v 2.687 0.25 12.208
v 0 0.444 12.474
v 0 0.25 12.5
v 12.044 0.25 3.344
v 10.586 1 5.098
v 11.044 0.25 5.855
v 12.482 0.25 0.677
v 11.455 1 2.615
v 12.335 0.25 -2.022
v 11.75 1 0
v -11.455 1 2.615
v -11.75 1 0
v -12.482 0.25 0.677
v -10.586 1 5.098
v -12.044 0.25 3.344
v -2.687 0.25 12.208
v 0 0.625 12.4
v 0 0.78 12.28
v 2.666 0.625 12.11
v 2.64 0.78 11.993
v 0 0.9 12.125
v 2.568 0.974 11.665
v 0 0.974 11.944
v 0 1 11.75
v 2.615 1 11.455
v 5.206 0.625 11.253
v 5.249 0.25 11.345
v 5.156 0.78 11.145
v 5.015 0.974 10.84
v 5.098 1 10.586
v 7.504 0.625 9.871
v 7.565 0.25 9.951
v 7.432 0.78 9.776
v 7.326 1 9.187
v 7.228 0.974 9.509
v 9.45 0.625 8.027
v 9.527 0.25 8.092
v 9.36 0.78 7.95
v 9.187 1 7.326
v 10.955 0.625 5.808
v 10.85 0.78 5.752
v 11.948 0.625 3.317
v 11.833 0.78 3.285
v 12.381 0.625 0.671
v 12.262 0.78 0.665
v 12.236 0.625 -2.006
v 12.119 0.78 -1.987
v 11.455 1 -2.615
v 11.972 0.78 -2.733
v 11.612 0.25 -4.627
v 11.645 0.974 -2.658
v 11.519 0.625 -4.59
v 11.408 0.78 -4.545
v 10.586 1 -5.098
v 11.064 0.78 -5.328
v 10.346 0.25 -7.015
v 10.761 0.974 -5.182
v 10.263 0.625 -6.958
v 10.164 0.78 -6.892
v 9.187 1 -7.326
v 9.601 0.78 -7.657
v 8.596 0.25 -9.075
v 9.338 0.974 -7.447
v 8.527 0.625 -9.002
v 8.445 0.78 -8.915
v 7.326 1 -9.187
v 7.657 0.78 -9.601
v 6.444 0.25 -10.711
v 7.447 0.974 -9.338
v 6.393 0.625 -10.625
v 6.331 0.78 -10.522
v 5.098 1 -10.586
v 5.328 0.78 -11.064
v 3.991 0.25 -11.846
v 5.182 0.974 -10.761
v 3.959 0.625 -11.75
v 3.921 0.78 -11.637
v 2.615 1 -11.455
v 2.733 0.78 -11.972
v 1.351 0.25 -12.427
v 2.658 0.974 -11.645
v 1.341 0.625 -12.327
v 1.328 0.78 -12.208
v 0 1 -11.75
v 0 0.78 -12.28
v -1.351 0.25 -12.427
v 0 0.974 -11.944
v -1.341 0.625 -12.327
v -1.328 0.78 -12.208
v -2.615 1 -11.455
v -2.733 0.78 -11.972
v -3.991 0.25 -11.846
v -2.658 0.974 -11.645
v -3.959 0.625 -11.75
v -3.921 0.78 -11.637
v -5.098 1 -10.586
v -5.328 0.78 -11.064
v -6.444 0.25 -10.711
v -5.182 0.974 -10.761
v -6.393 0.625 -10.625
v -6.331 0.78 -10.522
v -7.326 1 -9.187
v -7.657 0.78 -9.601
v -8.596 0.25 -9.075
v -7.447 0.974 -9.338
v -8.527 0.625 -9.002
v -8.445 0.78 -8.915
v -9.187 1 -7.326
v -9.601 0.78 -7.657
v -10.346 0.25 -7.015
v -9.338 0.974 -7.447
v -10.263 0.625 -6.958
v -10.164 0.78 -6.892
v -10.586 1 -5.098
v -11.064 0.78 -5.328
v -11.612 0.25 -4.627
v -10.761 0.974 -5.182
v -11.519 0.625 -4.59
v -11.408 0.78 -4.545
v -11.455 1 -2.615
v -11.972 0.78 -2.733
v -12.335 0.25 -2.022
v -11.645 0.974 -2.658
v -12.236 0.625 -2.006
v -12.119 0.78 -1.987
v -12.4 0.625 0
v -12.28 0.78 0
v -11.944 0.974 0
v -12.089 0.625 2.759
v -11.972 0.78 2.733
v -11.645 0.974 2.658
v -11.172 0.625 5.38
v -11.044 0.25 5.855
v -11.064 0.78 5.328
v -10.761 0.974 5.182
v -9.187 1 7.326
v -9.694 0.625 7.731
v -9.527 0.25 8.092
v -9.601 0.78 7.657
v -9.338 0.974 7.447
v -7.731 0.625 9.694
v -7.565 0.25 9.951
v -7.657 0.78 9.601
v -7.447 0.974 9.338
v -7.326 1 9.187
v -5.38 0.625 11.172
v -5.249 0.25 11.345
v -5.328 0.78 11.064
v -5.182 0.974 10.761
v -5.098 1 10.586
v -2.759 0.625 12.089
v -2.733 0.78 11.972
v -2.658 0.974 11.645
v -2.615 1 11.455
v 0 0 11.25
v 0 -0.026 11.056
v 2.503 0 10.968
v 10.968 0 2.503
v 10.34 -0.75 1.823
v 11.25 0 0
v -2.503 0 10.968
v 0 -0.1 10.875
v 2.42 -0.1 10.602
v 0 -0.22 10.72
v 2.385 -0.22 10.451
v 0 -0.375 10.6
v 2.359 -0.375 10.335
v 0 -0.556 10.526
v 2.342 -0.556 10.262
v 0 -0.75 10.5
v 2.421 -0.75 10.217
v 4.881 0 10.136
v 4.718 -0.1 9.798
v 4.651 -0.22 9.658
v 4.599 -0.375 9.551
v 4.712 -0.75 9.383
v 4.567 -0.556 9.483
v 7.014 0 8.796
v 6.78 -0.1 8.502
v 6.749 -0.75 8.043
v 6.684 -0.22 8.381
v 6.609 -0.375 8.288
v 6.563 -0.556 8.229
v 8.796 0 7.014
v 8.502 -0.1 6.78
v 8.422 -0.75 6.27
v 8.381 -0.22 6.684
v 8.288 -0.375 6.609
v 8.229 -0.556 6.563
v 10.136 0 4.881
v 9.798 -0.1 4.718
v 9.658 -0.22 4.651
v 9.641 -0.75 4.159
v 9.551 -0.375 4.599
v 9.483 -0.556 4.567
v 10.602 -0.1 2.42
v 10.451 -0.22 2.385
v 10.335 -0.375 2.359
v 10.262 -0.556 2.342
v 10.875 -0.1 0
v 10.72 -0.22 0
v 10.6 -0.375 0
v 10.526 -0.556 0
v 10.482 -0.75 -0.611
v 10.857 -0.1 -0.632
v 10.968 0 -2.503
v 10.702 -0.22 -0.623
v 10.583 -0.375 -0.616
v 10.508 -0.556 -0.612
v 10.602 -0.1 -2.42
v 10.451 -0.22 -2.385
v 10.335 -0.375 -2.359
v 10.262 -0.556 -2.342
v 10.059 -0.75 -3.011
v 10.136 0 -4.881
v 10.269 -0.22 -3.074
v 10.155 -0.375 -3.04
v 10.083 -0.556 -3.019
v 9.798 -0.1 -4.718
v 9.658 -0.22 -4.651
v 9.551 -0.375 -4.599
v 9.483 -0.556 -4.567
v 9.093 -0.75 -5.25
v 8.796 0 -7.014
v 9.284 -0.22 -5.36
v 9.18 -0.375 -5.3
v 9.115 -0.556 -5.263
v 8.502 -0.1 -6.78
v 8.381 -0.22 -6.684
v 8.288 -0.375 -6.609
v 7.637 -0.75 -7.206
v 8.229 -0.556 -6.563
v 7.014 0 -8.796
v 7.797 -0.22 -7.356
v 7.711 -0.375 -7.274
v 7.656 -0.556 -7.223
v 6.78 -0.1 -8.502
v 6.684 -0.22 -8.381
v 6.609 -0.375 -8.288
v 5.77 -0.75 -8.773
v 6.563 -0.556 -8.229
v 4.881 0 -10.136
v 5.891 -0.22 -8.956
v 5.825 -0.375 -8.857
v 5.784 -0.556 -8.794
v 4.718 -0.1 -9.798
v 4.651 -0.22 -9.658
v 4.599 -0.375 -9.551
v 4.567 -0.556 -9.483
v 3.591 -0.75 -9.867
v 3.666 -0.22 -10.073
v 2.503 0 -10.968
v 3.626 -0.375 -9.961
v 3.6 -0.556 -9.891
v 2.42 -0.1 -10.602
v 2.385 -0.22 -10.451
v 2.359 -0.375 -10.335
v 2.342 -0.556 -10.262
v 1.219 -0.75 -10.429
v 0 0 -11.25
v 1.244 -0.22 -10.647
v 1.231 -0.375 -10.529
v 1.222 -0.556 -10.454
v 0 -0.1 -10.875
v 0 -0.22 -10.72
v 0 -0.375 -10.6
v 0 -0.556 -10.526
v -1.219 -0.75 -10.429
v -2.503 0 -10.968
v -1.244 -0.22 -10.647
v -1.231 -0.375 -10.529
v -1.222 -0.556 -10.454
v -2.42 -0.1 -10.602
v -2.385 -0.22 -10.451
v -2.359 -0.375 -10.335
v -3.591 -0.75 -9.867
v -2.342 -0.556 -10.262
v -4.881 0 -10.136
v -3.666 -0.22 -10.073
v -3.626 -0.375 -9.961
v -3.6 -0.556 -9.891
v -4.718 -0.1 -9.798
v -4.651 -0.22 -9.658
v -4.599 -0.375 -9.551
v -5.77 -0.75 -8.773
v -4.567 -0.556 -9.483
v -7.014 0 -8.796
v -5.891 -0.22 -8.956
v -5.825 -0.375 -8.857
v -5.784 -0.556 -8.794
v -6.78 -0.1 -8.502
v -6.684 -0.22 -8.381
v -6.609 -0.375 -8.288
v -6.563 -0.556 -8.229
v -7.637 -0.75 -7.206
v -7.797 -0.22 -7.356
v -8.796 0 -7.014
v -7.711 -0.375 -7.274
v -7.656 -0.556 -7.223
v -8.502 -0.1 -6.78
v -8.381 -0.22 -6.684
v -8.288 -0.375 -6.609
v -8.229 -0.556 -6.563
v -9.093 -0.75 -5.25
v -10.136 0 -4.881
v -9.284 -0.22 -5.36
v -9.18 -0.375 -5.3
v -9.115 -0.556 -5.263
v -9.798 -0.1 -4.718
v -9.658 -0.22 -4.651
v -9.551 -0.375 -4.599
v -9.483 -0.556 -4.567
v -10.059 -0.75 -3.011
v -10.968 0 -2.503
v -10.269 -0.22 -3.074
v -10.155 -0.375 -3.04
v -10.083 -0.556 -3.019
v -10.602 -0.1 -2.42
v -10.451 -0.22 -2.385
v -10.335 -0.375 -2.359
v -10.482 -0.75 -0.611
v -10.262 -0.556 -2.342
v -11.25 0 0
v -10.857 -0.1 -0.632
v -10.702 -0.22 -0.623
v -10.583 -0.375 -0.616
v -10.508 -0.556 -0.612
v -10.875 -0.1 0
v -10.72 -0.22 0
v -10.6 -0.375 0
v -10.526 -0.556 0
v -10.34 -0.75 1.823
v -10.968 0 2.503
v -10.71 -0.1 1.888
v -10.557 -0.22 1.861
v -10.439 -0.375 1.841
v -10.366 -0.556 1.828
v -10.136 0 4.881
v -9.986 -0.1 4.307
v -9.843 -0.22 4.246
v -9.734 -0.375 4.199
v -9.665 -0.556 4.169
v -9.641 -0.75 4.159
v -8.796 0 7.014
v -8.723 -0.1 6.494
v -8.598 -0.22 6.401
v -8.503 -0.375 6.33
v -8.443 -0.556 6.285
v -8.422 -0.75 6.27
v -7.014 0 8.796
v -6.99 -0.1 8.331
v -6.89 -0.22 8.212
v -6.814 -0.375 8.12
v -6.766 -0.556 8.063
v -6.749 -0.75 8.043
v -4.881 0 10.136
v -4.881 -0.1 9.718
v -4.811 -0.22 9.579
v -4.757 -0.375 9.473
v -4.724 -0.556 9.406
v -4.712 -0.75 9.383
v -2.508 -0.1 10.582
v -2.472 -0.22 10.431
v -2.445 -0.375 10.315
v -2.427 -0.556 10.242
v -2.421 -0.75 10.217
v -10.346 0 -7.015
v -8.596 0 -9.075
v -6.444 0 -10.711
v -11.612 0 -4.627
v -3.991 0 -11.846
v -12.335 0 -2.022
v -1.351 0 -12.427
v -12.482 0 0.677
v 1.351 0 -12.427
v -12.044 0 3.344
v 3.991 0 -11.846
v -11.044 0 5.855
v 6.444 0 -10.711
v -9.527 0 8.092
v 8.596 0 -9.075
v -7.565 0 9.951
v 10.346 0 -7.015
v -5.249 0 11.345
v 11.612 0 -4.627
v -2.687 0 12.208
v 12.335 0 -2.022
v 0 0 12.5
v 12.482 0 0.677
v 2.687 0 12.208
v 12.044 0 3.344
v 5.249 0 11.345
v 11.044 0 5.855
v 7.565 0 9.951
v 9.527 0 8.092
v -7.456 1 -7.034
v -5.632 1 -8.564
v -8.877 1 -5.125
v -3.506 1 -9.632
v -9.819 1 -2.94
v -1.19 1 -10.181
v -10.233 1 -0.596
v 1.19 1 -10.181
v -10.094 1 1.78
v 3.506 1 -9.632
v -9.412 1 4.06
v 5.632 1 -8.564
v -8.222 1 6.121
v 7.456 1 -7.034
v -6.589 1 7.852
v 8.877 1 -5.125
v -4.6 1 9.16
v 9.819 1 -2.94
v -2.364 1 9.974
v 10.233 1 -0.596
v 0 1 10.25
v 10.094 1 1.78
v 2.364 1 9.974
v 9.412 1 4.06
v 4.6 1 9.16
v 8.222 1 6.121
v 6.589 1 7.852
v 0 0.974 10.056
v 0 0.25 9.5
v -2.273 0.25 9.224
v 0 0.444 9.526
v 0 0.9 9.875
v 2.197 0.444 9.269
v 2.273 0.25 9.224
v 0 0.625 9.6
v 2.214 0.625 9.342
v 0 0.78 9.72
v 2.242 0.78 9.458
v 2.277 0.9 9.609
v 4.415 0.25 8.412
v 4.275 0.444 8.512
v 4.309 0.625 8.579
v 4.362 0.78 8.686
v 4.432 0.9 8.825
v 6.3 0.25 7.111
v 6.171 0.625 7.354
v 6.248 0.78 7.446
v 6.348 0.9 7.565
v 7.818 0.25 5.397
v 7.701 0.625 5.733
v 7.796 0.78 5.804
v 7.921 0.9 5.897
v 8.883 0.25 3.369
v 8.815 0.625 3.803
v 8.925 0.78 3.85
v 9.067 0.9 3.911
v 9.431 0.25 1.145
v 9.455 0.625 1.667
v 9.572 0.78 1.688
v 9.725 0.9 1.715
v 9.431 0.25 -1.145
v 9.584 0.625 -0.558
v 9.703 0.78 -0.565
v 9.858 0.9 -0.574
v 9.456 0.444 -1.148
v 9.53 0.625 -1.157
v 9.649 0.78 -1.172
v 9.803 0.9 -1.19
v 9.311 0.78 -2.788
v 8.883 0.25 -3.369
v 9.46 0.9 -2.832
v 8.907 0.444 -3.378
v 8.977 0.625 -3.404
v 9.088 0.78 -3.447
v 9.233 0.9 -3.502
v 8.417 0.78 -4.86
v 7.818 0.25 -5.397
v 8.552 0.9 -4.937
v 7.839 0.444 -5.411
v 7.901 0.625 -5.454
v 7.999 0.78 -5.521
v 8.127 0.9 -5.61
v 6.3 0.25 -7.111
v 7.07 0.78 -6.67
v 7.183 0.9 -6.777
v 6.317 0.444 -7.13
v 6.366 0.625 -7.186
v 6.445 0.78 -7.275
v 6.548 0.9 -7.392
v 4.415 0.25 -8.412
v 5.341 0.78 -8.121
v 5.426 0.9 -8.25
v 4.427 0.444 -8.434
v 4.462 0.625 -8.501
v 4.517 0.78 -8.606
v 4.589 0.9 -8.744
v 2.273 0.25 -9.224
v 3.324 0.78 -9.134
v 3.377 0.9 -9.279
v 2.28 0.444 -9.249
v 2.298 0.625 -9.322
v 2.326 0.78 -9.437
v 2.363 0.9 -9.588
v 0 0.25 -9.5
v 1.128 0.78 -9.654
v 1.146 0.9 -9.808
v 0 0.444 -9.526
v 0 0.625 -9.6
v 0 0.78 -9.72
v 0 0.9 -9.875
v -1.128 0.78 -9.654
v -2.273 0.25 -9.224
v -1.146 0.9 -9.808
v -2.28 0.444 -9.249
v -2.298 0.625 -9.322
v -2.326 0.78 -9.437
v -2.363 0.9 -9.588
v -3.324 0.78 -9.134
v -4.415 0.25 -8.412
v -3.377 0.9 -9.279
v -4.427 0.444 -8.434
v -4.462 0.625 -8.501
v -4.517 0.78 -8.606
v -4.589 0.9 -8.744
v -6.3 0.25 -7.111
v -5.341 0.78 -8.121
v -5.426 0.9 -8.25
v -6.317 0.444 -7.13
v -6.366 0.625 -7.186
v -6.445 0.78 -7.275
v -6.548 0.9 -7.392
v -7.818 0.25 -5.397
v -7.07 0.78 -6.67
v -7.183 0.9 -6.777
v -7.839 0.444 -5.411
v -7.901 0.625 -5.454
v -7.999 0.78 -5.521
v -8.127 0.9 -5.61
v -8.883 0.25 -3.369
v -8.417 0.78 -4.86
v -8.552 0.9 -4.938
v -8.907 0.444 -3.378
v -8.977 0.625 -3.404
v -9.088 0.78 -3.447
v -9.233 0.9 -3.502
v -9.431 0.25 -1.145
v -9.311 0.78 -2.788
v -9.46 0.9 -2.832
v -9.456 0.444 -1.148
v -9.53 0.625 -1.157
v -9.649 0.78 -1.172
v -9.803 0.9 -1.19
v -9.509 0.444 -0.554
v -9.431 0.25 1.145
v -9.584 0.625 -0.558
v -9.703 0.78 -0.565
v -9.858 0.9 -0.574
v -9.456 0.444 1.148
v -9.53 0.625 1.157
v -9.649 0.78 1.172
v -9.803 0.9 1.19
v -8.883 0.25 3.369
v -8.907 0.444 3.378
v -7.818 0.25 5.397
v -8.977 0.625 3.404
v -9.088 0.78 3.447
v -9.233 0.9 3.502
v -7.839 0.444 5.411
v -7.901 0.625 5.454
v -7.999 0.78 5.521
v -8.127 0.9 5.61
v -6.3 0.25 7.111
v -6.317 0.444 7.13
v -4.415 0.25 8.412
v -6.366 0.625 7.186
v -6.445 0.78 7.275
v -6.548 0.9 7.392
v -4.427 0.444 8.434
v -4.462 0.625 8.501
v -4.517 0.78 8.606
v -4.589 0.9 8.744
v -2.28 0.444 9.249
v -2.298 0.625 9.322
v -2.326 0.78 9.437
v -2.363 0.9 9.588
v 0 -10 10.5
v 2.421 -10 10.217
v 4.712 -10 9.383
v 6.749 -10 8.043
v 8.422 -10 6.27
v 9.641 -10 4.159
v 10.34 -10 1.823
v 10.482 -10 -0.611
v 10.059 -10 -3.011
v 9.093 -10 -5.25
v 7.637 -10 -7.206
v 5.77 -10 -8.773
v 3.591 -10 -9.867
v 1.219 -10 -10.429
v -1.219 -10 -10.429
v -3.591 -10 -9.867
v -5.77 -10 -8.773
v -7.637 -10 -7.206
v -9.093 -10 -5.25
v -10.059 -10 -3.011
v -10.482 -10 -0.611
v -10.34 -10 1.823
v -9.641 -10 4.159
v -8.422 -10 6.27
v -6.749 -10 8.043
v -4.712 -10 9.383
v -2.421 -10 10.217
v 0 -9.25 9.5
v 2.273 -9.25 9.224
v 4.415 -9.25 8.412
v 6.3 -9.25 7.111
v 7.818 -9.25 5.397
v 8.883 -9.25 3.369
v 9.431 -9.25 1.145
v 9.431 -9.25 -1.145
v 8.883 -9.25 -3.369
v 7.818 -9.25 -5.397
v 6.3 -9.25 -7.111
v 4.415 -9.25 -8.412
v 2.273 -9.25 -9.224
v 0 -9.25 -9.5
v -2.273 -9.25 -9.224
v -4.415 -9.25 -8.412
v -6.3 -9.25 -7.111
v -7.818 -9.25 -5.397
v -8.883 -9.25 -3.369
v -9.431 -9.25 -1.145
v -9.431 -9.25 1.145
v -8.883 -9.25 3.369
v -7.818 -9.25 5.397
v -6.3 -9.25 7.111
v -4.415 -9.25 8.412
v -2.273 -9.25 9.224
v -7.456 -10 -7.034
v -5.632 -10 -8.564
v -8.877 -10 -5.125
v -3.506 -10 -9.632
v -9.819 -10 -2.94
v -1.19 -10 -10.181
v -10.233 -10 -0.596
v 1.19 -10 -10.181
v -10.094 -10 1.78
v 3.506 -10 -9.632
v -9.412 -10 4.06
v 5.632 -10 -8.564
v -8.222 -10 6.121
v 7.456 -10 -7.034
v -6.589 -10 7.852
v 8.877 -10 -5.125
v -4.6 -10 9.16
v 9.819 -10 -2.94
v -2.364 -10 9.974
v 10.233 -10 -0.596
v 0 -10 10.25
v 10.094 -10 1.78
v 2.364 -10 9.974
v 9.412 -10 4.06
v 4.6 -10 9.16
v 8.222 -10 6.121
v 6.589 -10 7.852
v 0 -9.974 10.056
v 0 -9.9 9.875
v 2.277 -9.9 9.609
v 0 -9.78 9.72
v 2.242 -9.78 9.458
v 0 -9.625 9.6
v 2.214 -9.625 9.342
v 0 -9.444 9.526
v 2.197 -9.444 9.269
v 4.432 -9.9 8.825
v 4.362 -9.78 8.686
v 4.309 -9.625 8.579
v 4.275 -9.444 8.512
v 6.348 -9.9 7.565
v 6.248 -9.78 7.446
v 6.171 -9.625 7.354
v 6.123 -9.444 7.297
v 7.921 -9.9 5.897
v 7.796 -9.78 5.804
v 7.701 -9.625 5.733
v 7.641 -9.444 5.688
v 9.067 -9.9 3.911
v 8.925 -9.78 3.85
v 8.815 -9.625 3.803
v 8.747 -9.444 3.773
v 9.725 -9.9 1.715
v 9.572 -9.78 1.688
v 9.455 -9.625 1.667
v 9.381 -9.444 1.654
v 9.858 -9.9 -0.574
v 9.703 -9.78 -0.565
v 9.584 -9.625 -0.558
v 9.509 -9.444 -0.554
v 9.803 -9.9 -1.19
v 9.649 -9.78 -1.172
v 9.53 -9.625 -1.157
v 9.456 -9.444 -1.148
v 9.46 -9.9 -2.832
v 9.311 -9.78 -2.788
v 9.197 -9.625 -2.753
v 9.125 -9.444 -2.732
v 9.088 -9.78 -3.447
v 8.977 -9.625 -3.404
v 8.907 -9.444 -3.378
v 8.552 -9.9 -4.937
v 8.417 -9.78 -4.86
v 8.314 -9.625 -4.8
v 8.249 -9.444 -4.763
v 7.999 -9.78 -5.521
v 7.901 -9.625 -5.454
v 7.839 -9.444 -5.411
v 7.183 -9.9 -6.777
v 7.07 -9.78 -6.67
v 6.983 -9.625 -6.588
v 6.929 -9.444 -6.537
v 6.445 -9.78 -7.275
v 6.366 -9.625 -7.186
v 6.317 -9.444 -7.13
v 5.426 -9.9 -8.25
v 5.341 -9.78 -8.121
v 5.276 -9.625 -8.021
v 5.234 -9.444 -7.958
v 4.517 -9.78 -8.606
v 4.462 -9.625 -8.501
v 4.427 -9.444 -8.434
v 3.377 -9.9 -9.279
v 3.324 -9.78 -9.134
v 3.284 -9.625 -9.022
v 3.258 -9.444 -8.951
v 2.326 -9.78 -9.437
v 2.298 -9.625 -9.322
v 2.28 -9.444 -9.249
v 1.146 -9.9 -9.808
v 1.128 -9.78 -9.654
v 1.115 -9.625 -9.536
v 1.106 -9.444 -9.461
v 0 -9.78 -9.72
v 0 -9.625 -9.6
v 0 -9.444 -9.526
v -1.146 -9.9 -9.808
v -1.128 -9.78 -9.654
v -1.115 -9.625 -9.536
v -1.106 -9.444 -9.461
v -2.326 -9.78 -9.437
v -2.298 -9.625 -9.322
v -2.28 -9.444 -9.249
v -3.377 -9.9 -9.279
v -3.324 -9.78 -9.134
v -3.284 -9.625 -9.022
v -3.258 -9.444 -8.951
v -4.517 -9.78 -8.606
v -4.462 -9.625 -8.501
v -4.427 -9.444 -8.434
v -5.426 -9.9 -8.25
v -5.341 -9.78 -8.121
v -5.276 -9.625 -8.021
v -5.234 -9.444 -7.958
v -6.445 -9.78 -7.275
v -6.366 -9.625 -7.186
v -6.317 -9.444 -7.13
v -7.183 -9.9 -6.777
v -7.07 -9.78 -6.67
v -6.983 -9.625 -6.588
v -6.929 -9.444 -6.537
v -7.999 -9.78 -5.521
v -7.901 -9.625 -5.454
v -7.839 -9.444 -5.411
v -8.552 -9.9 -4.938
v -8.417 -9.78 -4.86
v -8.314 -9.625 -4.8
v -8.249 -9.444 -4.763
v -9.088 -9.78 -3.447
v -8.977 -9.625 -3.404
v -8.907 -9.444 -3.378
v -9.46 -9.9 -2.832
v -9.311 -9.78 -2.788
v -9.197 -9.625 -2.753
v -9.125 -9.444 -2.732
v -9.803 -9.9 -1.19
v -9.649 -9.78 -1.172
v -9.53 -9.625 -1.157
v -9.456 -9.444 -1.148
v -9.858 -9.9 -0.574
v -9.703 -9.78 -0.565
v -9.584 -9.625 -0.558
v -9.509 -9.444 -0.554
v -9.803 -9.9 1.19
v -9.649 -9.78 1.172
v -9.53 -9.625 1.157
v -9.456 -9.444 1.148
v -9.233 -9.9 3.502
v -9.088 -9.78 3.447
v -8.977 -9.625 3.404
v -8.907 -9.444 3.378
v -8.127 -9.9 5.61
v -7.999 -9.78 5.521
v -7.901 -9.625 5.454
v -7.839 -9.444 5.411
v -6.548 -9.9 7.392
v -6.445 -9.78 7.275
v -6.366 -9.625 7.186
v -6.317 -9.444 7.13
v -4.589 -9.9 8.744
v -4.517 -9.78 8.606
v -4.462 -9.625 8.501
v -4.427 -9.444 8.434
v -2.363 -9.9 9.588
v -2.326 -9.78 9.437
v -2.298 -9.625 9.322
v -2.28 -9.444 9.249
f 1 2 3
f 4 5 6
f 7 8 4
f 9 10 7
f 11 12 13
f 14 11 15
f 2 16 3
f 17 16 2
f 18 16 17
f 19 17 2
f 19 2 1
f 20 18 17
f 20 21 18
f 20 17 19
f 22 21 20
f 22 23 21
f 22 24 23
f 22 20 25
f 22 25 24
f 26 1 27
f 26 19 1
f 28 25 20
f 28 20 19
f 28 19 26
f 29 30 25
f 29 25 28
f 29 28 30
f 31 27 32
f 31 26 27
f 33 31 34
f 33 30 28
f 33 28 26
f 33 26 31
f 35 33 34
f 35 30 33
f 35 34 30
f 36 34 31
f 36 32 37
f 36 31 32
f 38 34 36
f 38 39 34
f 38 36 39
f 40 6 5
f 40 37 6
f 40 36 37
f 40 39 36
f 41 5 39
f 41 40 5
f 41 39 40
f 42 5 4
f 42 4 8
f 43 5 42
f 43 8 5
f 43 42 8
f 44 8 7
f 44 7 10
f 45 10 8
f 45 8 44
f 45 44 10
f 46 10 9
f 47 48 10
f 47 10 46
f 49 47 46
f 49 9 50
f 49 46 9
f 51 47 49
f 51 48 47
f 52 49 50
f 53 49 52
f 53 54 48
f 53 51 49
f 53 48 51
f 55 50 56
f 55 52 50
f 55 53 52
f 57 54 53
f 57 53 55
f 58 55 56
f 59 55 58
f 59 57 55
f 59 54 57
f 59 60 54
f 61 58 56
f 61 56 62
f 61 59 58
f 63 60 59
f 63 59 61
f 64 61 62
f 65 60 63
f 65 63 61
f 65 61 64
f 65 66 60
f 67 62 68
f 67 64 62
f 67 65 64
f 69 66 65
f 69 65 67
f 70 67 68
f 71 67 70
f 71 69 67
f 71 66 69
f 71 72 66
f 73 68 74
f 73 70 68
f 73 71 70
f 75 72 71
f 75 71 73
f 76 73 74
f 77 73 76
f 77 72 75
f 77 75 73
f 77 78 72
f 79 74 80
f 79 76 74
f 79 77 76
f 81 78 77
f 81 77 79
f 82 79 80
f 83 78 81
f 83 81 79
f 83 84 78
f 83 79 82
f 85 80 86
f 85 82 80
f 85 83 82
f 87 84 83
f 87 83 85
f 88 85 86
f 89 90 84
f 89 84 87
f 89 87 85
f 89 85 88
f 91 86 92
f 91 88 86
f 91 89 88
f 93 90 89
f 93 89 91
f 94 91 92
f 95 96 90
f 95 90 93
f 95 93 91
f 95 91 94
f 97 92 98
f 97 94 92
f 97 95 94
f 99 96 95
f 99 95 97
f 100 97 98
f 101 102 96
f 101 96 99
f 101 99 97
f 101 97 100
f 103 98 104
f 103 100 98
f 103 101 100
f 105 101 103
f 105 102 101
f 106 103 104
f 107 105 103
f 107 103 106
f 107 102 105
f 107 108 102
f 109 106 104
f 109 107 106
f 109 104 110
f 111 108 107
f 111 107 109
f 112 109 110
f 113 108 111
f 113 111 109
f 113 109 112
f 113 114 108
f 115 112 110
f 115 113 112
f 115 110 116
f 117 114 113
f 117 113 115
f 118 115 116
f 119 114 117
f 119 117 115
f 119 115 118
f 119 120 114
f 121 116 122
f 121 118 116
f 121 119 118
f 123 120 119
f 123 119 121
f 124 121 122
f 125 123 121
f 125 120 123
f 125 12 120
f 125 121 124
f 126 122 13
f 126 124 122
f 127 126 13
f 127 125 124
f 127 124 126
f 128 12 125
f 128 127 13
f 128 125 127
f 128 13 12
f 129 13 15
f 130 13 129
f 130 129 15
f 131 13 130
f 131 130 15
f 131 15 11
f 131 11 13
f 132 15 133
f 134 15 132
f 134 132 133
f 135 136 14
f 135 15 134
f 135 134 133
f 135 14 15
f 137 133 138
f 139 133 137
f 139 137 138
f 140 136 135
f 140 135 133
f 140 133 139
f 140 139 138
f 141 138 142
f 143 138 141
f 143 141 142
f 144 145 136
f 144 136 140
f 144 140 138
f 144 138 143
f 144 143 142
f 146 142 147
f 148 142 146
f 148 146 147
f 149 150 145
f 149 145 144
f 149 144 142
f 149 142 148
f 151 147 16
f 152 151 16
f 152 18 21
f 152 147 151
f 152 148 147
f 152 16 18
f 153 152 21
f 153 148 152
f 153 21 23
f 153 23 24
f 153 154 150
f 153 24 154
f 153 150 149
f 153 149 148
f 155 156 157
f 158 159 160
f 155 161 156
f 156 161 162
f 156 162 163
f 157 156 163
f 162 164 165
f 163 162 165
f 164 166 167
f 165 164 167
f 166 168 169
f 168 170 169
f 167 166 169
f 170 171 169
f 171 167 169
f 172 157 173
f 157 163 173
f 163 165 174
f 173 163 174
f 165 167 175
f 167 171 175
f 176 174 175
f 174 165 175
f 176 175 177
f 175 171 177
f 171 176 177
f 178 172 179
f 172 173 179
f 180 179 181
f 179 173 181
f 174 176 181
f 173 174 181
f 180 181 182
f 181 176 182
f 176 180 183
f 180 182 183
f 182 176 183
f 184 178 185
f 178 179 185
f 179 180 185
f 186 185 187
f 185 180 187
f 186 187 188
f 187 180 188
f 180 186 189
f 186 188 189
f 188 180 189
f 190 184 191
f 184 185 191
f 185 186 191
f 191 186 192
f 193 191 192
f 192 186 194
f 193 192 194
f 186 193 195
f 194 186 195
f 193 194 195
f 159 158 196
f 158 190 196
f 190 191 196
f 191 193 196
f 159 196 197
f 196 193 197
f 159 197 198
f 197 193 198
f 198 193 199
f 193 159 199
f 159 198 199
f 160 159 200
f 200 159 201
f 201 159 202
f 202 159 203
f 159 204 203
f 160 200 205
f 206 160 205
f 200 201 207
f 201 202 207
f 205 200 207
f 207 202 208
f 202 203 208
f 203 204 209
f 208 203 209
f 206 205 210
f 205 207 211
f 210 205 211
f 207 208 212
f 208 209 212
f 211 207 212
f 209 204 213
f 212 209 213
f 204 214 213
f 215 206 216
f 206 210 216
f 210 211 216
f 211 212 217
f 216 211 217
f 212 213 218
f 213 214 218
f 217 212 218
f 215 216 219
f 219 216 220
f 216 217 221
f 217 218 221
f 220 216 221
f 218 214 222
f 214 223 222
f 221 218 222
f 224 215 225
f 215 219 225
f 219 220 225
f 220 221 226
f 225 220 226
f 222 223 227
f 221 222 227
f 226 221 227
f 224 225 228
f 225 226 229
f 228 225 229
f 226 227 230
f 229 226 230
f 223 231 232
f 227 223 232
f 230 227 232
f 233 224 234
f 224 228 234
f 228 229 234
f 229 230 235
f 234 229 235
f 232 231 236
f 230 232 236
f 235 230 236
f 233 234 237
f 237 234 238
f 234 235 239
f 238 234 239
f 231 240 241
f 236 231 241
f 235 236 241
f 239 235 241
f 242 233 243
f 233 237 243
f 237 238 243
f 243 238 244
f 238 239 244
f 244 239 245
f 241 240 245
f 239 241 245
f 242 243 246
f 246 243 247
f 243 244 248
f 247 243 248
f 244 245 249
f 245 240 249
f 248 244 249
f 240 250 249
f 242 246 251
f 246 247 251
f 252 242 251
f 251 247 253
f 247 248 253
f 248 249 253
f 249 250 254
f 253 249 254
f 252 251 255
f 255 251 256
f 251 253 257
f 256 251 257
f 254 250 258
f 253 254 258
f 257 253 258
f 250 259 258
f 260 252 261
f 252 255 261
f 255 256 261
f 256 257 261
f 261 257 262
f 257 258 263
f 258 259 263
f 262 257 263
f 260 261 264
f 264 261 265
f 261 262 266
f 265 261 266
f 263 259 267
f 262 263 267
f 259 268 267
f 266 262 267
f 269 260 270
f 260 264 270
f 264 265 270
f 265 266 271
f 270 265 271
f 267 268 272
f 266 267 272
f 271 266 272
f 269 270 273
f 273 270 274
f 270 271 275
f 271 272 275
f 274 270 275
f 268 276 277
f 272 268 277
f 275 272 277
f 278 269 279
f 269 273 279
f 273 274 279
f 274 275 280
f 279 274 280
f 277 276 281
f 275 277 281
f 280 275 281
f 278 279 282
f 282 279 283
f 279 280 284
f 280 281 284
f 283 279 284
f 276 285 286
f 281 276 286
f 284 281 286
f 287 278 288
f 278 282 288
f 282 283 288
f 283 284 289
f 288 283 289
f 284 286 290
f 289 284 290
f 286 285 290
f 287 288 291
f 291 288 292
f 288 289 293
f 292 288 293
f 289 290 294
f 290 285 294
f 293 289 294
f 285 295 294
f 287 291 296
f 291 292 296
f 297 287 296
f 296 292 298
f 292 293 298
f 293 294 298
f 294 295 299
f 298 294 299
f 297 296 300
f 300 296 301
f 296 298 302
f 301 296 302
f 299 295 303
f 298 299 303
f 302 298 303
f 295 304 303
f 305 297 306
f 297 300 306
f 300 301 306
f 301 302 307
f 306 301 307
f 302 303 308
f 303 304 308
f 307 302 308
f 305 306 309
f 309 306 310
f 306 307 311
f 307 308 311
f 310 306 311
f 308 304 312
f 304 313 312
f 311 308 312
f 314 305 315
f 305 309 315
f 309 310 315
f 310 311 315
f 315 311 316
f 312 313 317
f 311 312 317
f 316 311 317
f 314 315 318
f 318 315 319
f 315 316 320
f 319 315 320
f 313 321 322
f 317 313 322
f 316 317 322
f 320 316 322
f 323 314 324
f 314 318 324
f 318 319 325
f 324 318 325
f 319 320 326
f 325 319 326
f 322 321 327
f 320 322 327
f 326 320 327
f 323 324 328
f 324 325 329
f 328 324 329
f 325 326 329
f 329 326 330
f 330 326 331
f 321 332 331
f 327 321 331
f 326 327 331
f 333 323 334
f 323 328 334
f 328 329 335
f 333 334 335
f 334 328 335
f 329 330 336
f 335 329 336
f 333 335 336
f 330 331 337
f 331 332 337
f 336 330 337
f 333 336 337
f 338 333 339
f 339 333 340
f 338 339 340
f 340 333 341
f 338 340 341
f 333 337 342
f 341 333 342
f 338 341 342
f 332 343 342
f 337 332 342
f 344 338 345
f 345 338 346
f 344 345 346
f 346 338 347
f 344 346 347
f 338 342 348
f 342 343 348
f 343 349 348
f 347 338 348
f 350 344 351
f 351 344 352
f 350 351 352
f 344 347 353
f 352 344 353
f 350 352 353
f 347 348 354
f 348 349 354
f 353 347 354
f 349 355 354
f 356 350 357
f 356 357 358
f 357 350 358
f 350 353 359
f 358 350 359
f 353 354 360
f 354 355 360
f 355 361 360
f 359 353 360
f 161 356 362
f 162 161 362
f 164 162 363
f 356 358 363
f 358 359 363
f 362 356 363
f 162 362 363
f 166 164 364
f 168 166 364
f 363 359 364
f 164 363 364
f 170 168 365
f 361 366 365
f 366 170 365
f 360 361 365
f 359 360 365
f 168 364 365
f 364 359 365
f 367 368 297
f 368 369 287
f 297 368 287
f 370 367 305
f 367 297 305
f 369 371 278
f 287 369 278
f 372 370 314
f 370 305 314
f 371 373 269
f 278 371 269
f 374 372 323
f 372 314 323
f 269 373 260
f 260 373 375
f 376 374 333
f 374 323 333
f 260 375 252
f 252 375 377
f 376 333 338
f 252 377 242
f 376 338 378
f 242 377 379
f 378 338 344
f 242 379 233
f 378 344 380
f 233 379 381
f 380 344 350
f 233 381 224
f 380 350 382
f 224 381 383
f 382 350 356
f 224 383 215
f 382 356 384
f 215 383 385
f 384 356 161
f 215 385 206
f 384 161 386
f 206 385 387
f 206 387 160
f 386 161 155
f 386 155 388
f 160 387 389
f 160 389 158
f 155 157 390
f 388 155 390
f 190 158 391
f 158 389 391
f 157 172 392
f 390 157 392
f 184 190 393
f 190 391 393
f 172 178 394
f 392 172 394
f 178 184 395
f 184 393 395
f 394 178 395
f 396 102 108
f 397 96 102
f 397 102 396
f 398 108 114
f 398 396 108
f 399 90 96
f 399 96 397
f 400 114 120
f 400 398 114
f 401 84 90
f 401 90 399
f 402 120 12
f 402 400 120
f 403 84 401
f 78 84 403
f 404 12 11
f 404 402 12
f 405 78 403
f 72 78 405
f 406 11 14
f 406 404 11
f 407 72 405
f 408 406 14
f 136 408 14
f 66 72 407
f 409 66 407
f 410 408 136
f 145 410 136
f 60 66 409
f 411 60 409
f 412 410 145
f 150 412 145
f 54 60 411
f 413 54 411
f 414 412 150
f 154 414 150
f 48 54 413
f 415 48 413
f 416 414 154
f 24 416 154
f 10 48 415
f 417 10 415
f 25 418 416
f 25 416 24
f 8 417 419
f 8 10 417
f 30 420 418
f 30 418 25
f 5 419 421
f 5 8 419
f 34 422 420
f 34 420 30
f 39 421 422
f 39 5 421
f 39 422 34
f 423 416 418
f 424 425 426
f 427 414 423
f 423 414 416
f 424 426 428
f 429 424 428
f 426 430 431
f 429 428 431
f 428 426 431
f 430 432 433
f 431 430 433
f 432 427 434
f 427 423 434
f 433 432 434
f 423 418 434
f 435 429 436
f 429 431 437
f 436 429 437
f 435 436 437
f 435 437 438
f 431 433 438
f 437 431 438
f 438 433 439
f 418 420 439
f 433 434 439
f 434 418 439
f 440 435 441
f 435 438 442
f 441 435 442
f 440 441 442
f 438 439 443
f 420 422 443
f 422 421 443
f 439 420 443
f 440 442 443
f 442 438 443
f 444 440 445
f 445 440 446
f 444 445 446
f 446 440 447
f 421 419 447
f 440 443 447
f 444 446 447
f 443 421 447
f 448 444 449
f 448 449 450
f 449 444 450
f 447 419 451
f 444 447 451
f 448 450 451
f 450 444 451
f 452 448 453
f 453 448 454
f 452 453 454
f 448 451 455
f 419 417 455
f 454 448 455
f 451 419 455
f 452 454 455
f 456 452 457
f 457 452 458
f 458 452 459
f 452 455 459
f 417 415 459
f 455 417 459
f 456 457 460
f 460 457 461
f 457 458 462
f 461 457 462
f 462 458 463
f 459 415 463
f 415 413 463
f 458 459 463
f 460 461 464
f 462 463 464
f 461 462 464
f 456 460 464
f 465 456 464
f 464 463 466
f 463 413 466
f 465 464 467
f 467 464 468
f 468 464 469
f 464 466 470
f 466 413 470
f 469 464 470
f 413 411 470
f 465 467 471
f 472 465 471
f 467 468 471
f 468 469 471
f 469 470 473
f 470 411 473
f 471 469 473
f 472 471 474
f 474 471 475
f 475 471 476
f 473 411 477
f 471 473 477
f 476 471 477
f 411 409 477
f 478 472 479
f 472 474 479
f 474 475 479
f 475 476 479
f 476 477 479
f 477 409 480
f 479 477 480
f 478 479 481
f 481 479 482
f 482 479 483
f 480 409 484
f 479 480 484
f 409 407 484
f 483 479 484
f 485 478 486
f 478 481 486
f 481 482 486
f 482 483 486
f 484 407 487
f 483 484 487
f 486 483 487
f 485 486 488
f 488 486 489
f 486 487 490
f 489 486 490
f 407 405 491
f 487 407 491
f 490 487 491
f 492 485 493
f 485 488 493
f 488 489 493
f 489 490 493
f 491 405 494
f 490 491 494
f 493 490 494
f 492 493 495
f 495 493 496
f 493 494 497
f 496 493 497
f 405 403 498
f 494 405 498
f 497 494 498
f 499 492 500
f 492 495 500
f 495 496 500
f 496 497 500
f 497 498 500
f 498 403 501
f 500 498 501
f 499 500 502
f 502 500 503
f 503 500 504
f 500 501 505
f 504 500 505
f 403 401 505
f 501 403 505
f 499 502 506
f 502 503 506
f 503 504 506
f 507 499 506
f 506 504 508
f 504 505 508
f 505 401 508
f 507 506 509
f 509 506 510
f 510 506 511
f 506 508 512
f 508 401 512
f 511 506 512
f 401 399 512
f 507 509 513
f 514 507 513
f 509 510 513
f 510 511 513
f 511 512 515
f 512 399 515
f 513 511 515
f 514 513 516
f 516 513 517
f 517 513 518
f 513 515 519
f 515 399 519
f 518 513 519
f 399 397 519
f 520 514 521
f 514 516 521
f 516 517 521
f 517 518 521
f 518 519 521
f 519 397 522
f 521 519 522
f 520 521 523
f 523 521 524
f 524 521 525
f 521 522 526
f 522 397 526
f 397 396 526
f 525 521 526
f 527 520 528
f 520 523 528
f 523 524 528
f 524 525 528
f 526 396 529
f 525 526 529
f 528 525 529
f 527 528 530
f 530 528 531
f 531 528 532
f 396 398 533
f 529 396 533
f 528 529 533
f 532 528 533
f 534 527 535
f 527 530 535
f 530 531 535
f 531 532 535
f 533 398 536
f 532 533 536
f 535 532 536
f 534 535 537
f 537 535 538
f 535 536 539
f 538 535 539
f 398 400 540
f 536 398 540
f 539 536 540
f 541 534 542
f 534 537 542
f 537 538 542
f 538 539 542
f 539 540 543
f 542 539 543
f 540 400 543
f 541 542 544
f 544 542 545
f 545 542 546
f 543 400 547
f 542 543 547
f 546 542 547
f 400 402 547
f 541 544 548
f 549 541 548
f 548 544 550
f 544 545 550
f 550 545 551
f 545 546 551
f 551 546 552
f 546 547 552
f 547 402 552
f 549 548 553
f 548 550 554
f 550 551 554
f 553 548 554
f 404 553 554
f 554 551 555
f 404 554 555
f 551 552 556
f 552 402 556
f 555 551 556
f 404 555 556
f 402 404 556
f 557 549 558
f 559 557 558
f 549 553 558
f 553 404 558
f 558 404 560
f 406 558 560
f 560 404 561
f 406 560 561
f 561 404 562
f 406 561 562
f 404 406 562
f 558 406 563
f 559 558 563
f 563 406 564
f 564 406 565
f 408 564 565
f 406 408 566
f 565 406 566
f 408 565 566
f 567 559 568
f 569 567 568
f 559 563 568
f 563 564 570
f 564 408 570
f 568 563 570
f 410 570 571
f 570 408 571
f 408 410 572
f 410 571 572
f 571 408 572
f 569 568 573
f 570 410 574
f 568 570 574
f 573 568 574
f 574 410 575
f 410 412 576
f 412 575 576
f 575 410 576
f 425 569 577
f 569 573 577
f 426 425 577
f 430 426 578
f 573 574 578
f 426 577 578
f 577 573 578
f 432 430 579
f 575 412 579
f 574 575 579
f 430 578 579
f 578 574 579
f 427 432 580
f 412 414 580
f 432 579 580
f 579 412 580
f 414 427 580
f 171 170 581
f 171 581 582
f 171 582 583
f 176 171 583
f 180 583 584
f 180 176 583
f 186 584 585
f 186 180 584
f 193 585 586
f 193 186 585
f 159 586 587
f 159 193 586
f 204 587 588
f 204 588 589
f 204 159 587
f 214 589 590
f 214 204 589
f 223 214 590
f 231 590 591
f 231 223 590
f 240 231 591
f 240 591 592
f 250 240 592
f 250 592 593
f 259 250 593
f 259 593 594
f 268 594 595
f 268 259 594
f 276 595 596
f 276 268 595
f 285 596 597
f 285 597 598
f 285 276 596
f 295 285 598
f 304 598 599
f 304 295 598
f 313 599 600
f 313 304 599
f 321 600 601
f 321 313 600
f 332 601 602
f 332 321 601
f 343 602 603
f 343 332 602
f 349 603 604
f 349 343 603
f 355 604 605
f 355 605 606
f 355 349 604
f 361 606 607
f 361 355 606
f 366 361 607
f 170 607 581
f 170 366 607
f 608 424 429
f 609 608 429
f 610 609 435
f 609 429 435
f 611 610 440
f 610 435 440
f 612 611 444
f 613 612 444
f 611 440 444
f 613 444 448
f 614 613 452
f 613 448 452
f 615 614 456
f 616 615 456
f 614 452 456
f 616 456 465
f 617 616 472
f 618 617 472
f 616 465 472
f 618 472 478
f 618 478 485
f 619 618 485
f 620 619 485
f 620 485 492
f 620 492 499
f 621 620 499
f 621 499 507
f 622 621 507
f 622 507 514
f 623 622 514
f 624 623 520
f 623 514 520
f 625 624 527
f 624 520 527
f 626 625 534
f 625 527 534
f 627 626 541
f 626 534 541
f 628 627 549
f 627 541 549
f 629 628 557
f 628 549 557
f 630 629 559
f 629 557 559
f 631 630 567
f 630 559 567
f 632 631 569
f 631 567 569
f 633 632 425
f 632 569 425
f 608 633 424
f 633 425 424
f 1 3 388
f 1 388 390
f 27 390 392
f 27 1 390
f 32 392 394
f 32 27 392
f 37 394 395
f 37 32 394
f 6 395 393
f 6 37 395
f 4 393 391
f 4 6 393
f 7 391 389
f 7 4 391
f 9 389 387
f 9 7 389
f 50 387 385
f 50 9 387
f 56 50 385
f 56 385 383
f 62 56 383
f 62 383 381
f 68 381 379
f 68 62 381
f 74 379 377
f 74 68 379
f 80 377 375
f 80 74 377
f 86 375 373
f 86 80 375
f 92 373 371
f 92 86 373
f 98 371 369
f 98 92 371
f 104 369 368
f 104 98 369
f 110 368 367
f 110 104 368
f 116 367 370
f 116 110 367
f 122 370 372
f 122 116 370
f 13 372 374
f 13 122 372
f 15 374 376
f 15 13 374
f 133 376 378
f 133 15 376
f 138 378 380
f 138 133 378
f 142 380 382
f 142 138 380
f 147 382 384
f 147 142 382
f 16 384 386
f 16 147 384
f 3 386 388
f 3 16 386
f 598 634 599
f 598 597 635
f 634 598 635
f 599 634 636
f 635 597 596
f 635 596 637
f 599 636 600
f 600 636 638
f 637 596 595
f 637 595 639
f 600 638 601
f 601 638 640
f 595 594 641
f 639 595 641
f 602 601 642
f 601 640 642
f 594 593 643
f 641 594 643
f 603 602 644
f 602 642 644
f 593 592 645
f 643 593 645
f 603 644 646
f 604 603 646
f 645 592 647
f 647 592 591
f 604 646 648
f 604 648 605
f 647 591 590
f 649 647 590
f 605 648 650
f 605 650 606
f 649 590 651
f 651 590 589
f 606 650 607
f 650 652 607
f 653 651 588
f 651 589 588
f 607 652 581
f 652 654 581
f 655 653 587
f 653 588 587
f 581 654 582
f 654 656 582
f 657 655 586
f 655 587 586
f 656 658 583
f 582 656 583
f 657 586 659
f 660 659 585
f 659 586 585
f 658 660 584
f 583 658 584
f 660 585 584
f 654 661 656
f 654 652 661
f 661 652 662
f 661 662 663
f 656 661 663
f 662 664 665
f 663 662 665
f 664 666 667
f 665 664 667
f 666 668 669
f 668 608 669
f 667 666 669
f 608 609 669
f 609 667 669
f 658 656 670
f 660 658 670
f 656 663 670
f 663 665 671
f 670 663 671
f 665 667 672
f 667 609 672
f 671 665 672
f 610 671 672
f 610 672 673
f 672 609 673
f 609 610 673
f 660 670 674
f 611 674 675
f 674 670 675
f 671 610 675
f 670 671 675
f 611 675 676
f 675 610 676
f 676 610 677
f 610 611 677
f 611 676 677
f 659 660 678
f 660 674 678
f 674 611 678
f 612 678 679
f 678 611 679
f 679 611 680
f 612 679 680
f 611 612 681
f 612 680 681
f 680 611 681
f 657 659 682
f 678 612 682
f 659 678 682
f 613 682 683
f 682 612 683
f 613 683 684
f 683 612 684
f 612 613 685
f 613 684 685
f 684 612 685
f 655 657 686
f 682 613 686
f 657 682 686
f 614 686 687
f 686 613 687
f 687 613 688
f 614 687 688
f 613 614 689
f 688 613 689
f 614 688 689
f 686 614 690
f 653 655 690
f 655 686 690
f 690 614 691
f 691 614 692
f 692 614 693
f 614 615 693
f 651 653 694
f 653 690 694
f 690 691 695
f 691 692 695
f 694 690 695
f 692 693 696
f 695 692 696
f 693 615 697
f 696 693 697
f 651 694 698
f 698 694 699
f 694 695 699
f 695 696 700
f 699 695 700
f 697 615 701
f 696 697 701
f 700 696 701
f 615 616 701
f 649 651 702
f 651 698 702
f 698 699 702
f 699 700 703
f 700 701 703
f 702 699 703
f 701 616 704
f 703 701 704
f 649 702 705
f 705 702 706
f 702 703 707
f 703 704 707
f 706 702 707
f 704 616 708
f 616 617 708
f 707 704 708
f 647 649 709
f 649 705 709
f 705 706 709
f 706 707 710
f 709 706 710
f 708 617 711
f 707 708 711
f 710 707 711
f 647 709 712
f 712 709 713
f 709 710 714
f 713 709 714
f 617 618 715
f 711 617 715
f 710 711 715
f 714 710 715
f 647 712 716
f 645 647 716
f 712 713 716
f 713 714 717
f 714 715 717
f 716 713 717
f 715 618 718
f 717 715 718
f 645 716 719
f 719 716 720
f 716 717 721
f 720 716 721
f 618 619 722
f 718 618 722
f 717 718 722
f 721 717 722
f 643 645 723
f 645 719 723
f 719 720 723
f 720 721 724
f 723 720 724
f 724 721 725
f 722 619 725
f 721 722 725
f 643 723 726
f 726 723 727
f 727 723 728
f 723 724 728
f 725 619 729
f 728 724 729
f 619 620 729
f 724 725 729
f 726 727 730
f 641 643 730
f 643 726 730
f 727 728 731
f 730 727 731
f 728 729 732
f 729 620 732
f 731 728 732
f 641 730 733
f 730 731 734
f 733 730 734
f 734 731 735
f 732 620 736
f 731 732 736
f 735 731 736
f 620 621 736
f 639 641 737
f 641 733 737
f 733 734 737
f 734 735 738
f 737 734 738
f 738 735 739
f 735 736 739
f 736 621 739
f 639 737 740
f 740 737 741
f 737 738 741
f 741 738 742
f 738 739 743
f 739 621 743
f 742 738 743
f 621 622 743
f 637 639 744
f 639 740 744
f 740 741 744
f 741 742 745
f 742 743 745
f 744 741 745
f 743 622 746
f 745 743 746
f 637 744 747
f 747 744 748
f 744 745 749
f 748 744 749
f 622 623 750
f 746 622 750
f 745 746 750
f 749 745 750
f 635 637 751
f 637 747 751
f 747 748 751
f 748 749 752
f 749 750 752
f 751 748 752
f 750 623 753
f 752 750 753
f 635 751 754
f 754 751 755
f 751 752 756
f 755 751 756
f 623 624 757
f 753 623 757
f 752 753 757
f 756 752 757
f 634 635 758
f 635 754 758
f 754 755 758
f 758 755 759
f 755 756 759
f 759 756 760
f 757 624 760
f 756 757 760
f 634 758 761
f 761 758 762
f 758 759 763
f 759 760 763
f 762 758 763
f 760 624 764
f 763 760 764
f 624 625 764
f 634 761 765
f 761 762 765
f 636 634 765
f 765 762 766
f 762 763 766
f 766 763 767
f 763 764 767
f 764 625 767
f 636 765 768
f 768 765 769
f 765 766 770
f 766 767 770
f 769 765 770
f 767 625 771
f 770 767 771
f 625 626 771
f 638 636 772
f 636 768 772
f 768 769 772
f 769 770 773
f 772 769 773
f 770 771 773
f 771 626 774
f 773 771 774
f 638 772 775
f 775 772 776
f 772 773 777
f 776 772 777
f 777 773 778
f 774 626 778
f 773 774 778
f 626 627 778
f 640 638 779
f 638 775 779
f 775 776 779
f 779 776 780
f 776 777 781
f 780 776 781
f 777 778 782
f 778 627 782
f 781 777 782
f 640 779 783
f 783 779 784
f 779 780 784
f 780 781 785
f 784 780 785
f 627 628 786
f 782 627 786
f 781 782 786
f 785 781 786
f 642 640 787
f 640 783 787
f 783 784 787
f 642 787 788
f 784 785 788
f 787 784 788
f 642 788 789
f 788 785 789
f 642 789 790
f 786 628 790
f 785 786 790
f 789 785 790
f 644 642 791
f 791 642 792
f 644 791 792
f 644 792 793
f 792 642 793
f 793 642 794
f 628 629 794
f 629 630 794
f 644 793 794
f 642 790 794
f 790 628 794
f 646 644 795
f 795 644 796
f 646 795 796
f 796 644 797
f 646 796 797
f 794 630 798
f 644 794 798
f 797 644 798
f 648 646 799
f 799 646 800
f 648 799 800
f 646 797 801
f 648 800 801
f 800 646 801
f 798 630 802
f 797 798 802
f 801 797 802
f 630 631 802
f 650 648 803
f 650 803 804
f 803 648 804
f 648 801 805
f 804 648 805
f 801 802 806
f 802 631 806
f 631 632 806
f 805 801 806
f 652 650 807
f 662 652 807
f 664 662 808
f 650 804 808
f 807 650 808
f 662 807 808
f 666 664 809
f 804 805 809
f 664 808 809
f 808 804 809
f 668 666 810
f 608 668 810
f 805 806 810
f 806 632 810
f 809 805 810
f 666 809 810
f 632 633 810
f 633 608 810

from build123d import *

# Parameters (mm, degrees)
SKETCH1_R           = 10.5
SKETCH1_R_2         = 9.5
BOSS_EXTRUDE1_DEPTH = 10
BOSS_EXTRUDE2_START = 1
SKETCH2_R           = 12.5
SKETCH2_R_2         = 9.5
BOSS_EXTRUDE2_DEPTH = 1
FILLET1_R           = 0.75


with BuildPart() as part:
    # Sketch1 → Boss-Extrude1 (new body)
    with BuildSketch(Plane(origin=(0, 0, 0), x_dir=(1, 0, 0), z_dir=(0, 1, 0))):
        with Locations(Location((0, 0, 0), (0, 0, 270))):
            Circle(SKETCH1_R)
        with Locations(Location((0, 0, 0), (0, 0, 270))):
            Circle(SKETCH1_R_2, mode=Mode.SUBTRACT)
    extrude(amount=-BOSS_EXTRUDE1_DEPTH)

    # Sketch2 → Boss-Extrude2 (add)
    with BuildSketch(Plane(origin=(0, 0, 0), x_dir=(1, 0, 0), z_dir=(0, 1, 0)).offset(BOSS_EXTRUDE2_START)):
        with Locations(Location((0, 0, 0), (0, 0, 270))):
            Circle(SKETCH2_R)
        with Locations(Location((0, 0, 0), (0, 0, 270))):
            Circle(SKETCH2_R_2, mode=Mode.SUBTRACT)
    extrude(amount=-BOSS_EXTRUDE2_DEPTH)

    # Fillet1
    fillet1_edges = [part.edges().sort_by_distance(p)[0] for p in [
        (0, 1, -12.5),
        (0, 1, -9.5),
        (0, 0, -10.5),
        (0, -10, -9.5),
    ]]
    fillet(fillet1_edges, radius=FILLET1_R)


solid = part.part
